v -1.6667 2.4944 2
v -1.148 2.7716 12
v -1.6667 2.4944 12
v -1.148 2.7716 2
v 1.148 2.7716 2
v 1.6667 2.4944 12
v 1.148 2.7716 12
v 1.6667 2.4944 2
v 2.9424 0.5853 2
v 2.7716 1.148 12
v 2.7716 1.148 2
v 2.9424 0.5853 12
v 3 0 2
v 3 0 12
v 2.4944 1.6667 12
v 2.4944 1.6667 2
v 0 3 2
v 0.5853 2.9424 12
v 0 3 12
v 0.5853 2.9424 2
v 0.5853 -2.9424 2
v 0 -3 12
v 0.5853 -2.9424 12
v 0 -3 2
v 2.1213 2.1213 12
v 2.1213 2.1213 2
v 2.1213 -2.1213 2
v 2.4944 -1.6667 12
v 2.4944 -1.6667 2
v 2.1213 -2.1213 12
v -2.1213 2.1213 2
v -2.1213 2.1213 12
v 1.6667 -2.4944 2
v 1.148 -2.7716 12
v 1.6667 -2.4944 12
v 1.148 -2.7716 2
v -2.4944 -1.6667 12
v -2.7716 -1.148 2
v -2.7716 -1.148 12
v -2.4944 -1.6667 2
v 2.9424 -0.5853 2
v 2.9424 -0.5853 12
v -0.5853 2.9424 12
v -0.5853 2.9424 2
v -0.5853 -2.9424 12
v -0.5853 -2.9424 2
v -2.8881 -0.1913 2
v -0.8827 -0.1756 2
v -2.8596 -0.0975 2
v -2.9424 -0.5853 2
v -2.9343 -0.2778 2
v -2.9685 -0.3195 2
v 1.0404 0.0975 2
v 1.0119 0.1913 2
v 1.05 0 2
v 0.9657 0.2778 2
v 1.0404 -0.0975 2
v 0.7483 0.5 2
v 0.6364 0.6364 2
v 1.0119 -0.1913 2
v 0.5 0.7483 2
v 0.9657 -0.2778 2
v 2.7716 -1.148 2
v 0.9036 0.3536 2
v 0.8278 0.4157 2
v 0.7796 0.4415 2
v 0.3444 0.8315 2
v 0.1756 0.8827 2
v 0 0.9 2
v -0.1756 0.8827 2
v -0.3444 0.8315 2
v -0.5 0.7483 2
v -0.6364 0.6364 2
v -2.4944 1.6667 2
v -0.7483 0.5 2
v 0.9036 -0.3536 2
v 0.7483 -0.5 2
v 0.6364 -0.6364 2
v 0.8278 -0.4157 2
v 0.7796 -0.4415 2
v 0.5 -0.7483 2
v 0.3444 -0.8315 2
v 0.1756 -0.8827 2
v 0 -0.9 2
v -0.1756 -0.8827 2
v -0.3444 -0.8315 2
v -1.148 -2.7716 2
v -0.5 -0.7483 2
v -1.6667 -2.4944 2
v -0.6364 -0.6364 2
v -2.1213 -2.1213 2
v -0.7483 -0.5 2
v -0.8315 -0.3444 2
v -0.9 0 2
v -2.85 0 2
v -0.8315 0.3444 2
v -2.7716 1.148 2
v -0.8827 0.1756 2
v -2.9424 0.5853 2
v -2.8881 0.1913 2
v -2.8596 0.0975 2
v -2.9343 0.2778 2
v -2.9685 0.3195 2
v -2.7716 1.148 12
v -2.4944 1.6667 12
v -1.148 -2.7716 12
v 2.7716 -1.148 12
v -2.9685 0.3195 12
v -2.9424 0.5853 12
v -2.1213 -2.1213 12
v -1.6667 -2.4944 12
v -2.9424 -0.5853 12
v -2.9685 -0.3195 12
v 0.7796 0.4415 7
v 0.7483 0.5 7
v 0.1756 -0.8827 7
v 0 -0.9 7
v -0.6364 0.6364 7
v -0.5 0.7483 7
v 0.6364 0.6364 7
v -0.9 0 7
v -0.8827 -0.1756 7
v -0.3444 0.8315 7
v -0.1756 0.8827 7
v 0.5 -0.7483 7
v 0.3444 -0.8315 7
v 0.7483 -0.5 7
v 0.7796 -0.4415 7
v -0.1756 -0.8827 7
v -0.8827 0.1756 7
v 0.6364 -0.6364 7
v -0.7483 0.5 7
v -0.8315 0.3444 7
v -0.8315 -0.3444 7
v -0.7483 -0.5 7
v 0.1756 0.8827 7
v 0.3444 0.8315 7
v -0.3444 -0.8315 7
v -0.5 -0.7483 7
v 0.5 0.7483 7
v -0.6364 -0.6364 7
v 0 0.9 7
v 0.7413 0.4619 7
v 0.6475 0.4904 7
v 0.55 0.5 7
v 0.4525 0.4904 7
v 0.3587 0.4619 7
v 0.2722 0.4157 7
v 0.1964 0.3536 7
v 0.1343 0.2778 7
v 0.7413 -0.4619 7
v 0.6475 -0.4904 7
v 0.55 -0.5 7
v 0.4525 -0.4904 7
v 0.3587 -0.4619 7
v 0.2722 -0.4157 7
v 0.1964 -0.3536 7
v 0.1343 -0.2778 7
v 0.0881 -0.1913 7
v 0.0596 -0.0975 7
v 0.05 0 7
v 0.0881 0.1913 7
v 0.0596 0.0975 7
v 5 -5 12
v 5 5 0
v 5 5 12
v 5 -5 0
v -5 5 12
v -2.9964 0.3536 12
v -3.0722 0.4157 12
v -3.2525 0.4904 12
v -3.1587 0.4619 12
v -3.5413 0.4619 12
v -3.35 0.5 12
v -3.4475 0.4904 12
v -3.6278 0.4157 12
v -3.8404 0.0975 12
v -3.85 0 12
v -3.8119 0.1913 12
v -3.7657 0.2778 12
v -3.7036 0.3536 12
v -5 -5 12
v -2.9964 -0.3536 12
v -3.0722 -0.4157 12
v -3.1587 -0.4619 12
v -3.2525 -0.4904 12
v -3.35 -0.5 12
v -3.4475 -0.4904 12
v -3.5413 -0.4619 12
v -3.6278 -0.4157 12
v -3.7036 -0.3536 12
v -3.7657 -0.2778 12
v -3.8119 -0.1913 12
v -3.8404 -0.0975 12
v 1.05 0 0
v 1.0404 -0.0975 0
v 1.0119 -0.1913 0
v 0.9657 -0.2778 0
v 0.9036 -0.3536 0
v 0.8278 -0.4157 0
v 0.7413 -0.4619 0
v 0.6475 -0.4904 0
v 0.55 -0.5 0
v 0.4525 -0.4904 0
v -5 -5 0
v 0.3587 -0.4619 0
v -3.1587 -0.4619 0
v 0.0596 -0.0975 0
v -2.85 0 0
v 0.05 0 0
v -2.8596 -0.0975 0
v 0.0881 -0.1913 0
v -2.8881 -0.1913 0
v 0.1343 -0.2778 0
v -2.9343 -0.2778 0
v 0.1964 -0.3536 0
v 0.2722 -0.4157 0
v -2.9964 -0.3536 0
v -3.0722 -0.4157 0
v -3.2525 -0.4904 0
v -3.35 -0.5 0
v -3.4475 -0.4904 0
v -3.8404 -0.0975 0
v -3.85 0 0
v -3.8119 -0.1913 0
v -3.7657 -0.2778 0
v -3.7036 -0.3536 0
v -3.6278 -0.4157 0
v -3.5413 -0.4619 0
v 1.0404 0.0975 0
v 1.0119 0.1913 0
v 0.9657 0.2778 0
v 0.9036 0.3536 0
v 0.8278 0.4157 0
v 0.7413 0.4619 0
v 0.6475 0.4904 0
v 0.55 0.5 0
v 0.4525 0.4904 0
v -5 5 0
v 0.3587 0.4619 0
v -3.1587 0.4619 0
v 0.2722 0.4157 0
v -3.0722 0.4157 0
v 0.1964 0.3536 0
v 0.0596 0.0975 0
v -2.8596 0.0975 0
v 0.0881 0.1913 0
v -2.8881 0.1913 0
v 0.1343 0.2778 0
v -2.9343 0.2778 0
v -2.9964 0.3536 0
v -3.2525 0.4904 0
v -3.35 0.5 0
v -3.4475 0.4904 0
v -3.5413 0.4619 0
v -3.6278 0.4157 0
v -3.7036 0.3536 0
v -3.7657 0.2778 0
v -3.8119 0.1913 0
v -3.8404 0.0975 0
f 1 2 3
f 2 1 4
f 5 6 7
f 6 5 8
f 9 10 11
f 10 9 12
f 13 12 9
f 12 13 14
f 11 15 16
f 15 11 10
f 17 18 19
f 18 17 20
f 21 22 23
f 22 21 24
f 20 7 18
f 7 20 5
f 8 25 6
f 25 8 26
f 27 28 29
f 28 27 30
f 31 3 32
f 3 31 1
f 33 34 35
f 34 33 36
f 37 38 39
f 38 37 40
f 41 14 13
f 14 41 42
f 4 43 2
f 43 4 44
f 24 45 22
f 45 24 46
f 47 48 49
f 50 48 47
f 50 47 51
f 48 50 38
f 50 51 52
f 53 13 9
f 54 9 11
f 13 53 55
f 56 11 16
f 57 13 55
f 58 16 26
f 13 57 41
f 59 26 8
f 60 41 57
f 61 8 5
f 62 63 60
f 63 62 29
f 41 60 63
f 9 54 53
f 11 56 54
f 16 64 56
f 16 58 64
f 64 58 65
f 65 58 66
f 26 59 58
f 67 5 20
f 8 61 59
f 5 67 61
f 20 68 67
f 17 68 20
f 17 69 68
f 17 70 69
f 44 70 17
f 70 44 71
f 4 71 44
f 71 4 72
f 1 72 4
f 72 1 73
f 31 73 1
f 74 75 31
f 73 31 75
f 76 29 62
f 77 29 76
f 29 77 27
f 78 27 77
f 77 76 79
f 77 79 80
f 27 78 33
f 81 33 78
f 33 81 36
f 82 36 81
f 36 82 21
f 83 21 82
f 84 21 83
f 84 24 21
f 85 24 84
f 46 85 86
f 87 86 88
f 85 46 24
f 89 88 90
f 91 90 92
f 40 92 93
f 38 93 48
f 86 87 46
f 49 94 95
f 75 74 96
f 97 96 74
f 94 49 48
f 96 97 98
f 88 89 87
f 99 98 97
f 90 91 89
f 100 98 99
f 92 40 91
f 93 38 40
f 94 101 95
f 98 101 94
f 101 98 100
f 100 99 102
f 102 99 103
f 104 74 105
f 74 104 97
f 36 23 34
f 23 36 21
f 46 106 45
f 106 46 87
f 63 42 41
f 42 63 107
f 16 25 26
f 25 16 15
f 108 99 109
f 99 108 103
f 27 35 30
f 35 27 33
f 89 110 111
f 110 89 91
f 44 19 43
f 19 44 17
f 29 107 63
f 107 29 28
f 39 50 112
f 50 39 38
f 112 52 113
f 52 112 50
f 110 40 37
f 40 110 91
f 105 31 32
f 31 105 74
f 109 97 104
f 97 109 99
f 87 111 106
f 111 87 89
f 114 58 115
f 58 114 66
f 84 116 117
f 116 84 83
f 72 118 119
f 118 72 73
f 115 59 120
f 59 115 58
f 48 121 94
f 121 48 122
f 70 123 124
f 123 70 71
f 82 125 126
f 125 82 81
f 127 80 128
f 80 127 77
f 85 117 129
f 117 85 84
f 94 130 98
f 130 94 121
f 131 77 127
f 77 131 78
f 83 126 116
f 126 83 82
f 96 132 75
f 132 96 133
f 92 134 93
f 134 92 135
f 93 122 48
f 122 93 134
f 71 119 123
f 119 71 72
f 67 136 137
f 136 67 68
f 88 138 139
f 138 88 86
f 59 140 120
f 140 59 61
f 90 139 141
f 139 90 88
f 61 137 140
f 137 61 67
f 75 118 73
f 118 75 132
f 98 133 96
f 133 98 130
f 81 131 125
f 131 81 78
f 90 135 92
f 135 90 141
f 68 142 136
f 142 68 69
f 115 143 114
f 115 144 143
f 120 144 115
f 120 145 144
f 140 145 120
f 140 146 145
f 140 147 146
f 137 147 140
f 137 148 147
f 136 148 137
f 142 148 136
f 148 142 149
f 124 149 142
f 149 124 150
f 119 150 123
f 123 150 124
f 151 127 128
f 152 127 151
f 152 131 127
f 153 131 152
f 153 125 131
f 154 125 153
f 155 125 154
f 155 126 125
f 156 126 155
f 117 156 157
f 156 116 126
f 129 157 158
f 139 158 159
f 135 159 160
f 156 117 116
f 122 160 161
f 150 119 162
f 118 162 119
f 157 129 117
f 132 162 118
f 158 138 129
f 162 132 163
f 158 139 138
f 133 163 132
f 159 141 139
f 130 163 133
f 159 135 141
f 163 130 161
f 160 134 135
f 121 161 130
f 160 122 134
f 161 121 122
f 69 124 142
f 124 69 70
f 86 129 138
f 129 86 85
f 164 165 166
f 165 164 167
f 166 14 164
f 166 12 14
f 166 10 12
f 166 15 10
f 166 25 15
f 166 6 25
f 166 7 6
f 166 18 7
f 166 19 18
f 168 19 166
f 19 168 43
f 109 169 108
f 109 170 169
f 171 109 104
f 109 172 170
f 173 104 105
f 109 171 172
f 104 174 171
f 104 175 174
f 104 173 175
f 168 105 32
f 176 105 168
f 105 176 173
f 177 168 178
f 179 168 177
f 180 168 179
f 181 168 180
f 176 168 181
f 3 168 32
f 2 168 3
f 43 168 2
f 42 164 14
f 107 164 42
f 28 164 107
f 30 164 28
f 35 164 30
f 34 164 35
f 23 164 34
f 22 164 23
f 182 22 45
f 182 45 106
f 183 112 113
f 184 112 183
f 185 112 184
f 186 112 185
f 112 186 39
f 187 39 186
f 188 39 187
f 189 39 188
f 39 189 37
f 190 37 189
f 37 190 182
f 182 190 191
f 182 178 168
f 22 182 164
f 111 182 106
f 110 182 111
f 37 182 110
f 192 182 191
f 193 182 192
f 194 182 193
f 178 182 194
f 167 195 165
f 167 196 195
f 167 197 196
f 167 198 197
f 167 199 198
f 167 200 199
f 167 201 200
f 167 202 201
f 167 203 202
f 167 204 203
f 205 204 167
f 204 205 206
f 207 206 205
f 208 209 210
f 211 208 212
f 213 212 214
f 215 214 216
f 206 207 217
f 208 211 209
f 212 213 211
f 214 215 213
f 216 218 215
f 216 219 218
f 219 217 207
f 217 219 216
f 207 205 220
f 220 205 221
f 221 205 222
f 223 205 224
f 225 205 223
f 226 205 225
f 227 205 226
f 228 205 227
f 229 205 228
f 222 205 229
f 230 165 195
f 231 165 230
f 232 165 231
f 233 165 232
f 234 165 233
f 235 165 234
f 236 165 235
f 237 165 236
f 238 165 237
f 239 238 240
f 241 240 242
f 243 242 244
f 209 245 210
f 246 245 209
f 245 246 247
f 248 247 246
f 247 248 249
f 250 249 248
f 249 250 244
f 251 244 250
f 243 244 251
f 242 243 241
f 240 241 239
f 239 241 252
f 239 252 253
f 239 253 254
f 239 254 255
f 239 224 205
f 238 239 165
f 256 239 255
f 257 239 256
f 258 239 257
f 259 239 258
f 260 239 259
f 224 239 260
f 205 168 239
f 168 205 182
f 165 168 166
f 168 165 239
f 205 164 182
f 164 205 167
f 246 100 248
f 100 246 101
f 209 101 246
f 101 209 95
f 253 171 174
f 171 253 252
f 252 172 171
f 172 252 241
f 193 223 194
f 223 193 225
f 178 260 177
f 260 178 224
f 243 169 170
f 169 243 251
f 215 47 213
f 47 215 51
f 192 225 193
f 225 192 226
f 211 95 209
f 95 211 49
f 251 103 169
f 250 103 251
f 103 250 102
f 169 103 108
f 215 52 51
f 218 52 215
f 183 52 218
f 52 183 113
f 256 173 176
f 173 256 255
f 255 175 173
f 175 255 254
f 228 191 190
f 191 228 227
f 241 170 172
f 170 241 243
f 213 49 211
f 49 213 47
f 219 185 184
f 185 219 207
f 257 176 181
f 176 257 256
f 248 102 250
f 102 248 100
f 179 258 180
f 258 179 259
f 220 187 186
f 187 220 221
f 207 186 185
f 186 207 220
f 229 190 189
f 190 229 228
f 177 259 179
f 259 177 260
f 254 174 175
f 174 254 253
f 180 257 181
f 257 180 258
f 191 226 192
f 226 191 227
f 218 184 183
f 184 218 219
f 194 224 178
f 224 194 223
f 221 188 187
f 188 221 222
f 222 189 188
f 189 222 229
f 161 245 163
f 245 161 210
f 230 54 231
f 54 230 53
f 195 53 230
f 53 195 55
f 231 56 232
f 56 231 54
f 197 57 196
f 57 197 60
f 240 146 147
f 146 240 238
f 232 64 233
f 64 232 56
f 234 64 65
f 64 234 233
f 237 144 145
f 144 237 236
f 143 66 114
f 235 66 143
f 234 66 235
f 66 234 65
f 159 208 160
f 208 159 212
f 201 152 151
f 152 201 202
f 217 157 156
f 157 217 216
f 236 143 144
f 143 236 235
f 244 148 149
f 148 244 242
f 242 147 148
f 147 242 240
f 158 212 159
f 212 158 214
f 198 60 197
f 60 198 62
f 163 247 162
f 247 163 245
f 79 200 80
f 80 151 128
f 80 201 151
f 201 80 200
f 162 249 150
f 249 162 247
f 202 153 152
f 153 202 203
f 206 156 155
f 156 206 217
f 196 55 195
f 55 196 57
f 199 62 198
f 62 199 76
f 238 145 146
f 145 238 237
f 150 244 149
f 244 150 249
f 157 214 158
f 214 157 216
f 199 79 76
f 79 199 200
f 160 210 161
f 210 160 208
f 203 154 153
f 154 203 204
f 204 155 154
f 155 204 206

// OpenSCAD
_1_depth = 10;
_2_inner_depth = 5;
_3_outer_diameter = 6;
_4_inner_diameter = 1.8;
_5_wire_diameter = 1;
_6_wire_jut = _5_wire_diameter/2 * 0.3; 
_7_wall_thickness = 2;

$fn=64;

module barrel_connector(
  depth = 10,
  inner_depth = 5,
  outer_diameter = 4,
  inner_diameter = 2,
  wire_diameter = 1.3,
  wire_jut = 0.1,
  wall_thickness = 2) {
  $fn=32;
  difference() {
    or = outer_diameter / 2;
    ir = inner_diameter / 2;
    wr = wire_diameter / 2;
    wt = wall_thickness;
    translate([-or-wt, -or-wt, 0]) 
      cube([2 * wt + outer_diameter, 2 * wt + outer_diameter, depth + wt]);
      
    translate([-or-wr+wire_jut, 0, -.01])
      cylinder(r=wr, h=depth+wt+.02);// outer wire
    translate([ir-wr+wire_jut, 0, -.01])
      cylinder(r=wr, h=depth+wt+.02);// inner wire
    translate([0, 0, wt])
      difference() {
        cylinder(r=or, h=depth+.01); // outer barrel
        cylinder(r=ir, h=inner_depth); // inner barrel
      }
  }
}

barrel_connector(
  _1_depth,
  _2_inner_depth,
  _3_outer_diameter,
  _4_inner_diameter,
  _5_wire_diameter,
  _6_wire_jut,
  _7_wall_thickness);
